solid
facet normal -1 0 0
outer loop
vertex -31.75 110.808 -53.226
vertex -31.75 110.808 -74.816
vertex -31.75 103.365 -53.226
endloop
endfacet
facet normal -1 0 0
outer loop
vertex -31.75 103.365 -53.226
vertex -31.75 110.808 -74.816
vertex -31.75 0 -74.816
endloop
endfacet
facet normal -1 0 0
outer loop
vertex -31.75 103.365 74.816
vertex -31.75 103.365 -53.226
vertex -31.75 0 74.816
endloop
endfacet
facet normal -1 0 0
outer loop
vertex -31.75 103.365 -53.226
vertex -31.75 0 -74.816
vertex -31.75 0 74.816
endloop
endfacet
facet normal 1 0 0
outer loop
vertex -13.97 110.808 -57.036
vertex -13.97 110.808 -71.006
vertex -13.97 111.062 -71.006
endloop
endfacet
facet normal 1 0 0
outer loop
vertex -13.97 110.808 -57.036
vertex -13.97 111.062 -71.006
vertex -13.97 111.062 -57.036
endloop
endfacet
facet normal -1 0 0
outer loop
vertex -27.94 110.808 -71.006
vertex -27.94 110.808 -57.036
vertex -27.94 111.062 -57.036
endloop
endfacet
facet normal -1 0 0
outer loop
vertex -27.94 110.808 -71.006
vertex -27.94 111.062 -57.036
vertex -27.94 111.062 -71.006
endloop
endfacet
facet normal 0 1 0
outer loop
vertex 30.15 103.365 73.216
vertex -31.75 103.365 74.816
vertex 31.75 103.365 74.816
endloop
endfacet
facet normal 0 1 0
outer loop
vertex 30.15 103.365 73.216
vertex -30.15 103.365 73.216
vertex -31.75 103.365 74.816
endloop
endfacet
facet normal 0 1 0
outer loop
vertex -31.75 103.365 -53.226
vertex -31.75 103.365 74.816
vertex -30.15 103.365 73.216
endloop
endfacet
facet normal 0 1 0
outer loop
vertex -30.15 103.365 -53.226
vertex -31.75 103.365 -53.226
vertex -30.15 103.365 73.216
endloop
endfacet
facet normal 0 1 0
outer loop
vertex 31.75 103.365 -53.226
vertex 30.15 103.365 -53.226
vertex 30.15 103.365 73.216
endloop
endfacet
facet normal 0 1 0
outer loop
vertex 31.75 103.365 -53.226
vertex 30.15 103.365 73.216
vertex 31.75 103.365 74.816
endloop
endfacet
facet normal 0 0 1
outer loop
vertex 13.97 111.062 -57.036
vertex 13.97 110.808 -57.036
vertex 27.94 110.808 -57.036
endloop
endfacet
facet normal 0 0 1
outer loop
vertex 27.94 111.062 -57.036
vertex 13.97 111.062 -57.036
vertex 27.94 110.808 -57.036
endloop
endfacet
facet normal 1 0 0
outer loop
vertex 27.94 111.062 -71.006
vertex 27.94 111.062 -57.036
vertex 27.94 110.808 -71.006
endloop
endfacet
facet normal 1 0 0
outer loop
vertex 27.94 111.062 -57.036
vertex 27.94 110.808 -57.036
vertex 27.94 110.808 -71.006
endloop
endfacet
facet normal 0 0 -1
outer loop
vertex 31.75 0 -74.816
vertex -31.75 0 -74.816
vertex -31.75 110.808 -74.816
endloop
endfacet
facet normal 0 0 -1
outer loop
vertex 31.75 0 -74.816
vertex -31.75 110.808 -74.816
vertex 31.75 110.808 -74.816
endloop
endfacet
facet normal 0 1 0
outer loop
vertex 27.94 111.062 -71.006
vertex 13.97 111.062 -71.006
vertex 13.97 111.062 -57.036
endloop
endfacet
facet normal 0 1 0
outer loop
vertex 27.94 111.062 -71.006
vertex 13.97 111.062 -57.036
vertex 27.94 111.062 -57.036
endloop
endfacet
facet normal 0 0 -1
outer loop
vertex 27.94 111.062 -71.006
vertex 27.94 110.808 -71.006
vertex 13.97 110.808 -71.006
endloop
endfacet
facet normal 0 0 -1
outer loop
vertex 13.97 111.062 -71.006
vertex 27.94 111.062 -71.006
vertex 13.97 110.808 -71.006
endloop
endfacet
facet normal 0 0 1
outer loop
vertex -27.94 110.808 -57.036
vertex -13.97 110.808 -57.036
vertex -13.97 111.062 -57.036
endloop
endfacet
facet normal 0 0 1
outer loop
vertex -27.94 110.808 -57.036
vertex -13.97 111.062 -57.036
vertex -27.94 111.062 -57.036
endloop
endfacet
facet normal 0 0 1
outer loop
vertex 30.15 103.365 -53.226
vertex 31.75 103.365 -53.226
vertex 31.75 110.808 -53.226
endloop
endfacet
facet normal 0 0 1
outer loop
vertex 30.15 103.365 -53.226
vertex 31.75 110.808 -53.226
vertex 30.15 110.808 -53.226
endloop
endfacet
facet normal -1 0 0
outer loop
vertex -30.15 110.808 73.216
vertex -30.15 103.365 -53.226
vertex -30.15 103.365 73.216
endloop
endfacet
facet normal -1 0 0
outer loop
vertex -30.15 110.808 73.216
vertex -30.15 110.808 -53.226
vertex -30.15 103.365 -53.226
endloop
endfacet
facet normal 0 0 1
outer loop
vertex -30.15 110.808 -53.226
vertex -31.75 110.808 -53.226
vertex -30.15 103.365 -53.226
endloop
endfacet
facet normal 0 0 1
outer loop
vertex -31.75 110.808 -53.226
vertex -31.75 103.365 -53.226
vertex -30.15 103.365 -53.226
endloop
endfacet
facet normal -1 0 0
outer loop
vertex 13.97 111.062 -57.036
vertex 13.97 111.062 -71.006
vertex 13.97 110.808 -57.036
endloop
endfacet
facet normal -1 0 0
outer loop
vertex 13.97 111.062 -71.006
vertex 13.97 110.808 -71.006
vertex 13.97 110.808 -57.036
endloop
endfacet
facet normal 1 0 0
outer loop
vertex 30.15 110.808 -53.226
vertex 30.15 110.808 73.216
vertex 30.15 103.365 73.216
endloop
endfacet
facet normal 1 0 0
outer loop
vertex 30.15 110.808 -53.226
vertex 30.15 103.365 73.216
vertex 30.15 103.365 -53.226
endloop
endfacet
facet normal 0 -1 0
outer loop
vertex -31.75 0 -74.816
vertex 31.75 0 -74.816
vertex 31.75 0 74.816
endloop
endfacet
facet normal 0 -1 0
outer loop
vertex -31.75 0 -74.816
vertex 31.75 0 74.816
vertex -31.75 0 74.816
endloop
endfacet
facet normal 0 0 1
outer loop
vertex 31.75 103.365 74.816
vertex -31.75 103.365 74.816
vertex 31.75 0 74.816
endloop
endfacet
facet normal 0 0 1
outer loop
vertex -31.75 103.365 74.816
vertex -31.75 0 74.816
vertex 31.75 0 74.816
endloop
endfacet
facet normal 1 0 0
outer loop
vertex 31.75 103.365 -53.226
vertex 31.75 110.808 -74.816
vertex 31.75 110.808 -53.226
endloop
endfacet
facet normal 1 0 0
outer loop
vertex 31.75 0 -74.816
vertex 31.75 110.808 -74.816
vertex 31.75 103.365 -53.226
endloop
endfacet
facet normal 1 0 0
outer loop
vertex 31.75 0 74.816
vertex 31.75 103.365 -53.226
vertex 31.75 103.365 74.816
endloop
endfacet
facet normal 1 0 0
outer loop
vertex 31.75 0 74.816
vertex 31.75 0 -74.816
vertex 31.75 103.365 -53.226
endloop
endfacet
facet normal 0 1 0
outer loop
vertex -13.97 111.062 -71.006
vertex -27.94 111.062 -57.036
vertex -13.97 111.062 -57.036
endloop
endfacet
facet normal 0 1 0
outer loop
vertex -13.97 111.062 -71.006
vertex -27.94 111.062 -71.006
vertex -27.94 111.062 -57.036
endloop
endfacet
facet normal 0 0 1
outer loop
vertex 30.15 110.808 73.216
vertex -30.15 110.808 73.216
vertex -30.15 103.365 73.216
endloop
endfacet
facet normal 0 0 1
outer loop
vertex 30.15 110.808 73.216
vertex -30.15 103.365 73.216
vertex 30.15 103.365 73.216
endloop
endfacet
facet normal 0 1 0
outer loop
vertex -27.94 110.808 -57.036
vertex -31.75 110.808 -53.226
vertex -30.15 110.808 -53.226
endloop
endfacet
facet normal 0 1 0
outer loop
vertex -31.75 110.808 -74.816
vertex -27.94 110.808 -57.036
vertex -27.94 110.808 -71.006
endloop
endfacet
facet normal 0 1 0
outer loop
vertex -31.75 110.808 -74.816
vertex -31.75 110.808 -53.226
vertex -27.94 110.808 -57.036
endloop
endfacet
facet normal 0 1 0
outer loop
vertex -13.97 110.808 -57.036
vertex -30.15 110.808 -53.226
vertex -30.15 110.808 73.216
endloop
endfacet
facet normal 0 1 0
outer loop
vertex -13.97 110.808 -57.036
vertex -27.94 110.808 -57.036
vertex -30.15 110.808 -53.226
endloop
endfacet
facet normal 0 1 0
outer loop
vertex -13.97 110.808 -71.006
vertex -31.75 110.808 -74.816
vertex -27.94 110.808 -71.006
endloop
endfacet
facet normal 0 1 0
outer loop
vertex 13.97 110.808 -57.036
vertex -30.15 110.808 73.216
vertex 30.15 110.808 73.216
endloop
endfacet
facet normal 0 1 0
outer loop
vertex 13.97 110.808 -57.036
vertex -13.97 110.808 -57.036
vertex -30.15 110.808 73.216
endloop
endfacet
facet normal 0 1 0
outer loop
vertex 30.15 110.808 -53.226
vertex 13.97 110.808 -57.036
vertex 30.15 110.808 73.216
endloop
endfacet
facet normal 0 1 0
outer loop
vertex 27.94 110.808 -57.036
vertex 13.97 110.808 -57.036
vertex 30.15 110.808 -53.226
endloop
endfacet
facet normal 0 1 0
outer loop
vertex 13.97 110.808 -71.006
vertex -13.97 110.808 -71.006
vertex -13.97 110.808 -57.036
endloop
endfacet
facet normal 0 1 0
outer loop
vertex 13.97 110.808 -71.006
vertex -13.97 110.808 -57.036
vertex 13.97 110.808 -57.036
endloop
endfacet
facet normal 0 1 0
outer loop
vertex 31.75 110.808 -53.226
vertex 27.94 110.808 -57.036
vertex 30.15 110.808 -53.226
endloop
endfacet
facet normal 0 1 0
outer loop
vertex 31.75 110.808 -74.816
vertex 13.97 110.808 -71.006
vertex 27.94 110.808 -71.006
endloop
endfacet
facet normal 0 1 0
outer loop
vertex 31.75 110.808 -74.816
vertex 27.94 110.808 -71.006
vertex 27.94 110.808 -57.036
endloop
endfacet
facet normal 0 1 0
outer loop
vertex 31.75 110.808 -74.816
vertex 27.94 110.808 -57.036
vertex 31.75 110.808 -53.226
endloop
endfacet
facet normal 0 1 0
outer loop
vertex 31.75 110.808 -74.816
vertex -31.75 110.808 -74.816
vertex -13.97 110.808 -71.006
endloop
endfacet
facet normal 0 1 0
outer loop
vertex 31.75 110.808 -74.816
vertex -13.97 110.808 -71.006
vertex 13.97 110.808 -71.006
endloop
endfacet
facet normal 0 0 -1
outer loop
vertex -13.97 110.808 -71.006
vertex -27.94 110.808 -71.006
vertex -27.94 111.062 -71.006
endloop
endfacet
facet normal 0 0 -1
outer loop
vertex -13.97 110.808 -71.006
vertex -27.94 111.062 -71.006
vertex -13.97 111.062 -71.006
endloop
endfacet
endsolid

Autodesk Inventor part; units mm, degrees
ref_plane "YZ Plane" through (0, 0, 0) normal (1, 0, 0) x (0, 1, 0)
ref_plane "XZ Plane" through (0, 0, 0) normal (0, 1, 0) x (-1, 0, 0)
ref_plane "XY Plane" through (0, 0, 0) normal (0, 0, 1) x (1, 0, 0)
sketch "Sketch1" plane through (0, 0, 0) normal (0, 1, 0) x (-1, 0, 0)
  line L0 (31.75, 74.8157) -> (-31.75, 74.8157)
  line L1 (-31.75, 74.8157) -> (-31.75, -74.8157)
  line L2 (-31.75, -74.8157) -> (31.75, -74.8157)
  line L3 (31.75, -74.8157) -> (31.75, 74.8157)
  line L4 (0, 0) -> (31.75, 0) construction
  line L5 (0, 0) -> (0, 74.8157) construction
  line L6 (0, 0) -> (-31.75, 0) construction
  line L7 (0, 0) -> (0, -74.8157) construction
  dimension "d0" = 63.5
  dimension "d1" = 149.6314
extrude "Extrusion1" add sketch "Sketch1" along normal blind 110.8075
sketch "Sketch2" plane through (0, 110.8075, 0) normal (0, 1, 0) x (1, 0, 0)
  line L0 (-31.75, -74.8157) -> (31.75, -74.8157) projected
  line L1 (31.75, -74.8157) -> (31.75, 74.8157) projected
  line L2 (31.75, 74.8157) -> (-31.75, 74.8157) projected
  line L3 (-31.75, 74.8157) -> (-31.75, -74.8157) projected
  line L4 (-30.1498, -73.2155) -> (30.1498, -73.2155)
  line L5 (30.1498, -73.2155) -> (30.1498, 73.2155)
  line L6 (30.1498, 73.2155) -> (-30.1498, 73.2155)
  line L7 (-30.1498, 73.2155) -> (-30.1498, -73.2155)
  point P0 (0, 0)
  dimension "d4" = 1.6002
extrude "Extrusion2" cut sketch "Sketch2" against normal blind 7.4422
sketch "Sketch3" plane through (0, 103.3653, 0) normal (0, 1, 0) x (1, 0, 0)
  line L0 (-30.1498, 73.2155) -> (-30.1498, 53.2257)
  line L1 (30.1498, 73.2155) -> (-30.1498, 73.2155)
  line L2 (31.75, 74.8157) -> (31.75, 53.2257)
  line L3 (-31.75, 74.8157) -> (31.75, 74.8157)
  line L4 (30.1498, 73.2155) -> (-30.1498, 73.2155) projected
  line L5 (-31.75, 53.2257) -> (-30.1498, 53.2257)
  line L6 (31.75, 53.2257) -> (30.1498, 53.2257)
  line L7 (30.1498, 53.2257) -> (30.1498, 73.2155)
  line L8 (-31.75, 53.2257) -> (-31.75, 74.8157)
  point P0 (0, 0)
  dimension "d7" = 21.59
sketch "Sketch4" plane through (0, 103.3653, 0) normal (0, 1, 0) x (1, 0, 0)
  line L0 (-31.75, 74.8157) -> (31.75, 74.8157) projected
  line L1 (30.1498, 73.2155) -> (-30.1498, 73.2155) projected
  line L2 (-31.75, 74.8157) -> (-31.75, 53.2257)
  line L3 (-31.75, 53.2257) -> (-30.1498, 53.2257)
  line L4 (-30.1498, 73.2155) -> (-30.1498, 53.2257)
  line L5 (0, 73.2155) -> (0, 74.8157) construction
  line L6 (31.75, 74.8157) -> (31.75, 53.2257)
  line L7 (31.75, 53.2257) -> (30.1498, 53.2257)
  line L8 (30.1498, 73.2155) -> (30.1498, 53.2257)
  point P0 (0, 0)
  dimension "d8" = 21.59
extrude "Extrusion3" add sketch "Sketch4" along normal up to surface (7.4422 mm away)
sketch "Sketch5" plane through (-31.75, 0, 74.8157) normal (0, 0, 1) x (1, 0, 0)
  line L0 (22.0103, 51.8449) -> (31.9769, 51.8449) construction
  line L1 (31.9769, 51.8449) -> (31.9769, 48.6882) construction
  line L2 (31.9769, 48.6882) -> (22.0103, 48.6882) construction
  line L3 (22.0103, 48.6882) -> (22.0103, 51.8449) construction
sketch "Sketch6" plane through (31.75, 0, -74.8157) normal (0, 0, -1) x (-1, 0, 0)
  line L0 (18.5743, 56.7919) -> (44.5786, 56.7919) construction
  line L1 (44.5786, 56.7919) -> (44.5786, 50.439) construction
  line L2 (44.5786, 50.439) -> (18.5743, 50.439) construction
  line L3 (18.5743, 50.439) -> (18.5743, 56.7919) construction
sketch "Sketch7" plane through (0, 110.8075, 0) normal (0, 1, 0) x (1, 0, 0)
  line L0 (27.94, 71.0057) -> (13.97, 71.0057)
  line L1 (13.97, 71.0057) -> (13.97, 57.0357)
  line L2 (13.97, 57.0357) -> (27.94, 57.0357)
  line L3 (27.94, 57.0357) -> (27.94, 71.0057)
  line L4 (31.75, 74.8157) -> (31.75, 53.2257) construction
  line L5 (-31.75, 74.8157) -> (31.75, 74.8157) construction
  line L6 (0, 74.8157) -> (0, -73.2155) construction
  line L7 (-30.1498, -73.2155) -> (30.1498, -73.2155) construction
  line L8 (-27.94, 71.0057) -> (-13.97, 71.0057)
  line L9 (-13.97, 71.0057) -> (-13.97, 57.0357)
  line L10 (-13.97, 57.0357) -> (-27.94, 57.0357)
  line L11 (-27.94, 57.0357) -> (-27.94, 71.0057)
  point P0 (0, 0)
  dimension "d11" = 13.97
  dimension "d12" = 3.81
  dimension "d13" = 3.81
extrude "Extrusion4" add sketch "Sketch7" along normal blind 0.254
equation "\"d13\" = d12"
properties part number "BotBattery"
